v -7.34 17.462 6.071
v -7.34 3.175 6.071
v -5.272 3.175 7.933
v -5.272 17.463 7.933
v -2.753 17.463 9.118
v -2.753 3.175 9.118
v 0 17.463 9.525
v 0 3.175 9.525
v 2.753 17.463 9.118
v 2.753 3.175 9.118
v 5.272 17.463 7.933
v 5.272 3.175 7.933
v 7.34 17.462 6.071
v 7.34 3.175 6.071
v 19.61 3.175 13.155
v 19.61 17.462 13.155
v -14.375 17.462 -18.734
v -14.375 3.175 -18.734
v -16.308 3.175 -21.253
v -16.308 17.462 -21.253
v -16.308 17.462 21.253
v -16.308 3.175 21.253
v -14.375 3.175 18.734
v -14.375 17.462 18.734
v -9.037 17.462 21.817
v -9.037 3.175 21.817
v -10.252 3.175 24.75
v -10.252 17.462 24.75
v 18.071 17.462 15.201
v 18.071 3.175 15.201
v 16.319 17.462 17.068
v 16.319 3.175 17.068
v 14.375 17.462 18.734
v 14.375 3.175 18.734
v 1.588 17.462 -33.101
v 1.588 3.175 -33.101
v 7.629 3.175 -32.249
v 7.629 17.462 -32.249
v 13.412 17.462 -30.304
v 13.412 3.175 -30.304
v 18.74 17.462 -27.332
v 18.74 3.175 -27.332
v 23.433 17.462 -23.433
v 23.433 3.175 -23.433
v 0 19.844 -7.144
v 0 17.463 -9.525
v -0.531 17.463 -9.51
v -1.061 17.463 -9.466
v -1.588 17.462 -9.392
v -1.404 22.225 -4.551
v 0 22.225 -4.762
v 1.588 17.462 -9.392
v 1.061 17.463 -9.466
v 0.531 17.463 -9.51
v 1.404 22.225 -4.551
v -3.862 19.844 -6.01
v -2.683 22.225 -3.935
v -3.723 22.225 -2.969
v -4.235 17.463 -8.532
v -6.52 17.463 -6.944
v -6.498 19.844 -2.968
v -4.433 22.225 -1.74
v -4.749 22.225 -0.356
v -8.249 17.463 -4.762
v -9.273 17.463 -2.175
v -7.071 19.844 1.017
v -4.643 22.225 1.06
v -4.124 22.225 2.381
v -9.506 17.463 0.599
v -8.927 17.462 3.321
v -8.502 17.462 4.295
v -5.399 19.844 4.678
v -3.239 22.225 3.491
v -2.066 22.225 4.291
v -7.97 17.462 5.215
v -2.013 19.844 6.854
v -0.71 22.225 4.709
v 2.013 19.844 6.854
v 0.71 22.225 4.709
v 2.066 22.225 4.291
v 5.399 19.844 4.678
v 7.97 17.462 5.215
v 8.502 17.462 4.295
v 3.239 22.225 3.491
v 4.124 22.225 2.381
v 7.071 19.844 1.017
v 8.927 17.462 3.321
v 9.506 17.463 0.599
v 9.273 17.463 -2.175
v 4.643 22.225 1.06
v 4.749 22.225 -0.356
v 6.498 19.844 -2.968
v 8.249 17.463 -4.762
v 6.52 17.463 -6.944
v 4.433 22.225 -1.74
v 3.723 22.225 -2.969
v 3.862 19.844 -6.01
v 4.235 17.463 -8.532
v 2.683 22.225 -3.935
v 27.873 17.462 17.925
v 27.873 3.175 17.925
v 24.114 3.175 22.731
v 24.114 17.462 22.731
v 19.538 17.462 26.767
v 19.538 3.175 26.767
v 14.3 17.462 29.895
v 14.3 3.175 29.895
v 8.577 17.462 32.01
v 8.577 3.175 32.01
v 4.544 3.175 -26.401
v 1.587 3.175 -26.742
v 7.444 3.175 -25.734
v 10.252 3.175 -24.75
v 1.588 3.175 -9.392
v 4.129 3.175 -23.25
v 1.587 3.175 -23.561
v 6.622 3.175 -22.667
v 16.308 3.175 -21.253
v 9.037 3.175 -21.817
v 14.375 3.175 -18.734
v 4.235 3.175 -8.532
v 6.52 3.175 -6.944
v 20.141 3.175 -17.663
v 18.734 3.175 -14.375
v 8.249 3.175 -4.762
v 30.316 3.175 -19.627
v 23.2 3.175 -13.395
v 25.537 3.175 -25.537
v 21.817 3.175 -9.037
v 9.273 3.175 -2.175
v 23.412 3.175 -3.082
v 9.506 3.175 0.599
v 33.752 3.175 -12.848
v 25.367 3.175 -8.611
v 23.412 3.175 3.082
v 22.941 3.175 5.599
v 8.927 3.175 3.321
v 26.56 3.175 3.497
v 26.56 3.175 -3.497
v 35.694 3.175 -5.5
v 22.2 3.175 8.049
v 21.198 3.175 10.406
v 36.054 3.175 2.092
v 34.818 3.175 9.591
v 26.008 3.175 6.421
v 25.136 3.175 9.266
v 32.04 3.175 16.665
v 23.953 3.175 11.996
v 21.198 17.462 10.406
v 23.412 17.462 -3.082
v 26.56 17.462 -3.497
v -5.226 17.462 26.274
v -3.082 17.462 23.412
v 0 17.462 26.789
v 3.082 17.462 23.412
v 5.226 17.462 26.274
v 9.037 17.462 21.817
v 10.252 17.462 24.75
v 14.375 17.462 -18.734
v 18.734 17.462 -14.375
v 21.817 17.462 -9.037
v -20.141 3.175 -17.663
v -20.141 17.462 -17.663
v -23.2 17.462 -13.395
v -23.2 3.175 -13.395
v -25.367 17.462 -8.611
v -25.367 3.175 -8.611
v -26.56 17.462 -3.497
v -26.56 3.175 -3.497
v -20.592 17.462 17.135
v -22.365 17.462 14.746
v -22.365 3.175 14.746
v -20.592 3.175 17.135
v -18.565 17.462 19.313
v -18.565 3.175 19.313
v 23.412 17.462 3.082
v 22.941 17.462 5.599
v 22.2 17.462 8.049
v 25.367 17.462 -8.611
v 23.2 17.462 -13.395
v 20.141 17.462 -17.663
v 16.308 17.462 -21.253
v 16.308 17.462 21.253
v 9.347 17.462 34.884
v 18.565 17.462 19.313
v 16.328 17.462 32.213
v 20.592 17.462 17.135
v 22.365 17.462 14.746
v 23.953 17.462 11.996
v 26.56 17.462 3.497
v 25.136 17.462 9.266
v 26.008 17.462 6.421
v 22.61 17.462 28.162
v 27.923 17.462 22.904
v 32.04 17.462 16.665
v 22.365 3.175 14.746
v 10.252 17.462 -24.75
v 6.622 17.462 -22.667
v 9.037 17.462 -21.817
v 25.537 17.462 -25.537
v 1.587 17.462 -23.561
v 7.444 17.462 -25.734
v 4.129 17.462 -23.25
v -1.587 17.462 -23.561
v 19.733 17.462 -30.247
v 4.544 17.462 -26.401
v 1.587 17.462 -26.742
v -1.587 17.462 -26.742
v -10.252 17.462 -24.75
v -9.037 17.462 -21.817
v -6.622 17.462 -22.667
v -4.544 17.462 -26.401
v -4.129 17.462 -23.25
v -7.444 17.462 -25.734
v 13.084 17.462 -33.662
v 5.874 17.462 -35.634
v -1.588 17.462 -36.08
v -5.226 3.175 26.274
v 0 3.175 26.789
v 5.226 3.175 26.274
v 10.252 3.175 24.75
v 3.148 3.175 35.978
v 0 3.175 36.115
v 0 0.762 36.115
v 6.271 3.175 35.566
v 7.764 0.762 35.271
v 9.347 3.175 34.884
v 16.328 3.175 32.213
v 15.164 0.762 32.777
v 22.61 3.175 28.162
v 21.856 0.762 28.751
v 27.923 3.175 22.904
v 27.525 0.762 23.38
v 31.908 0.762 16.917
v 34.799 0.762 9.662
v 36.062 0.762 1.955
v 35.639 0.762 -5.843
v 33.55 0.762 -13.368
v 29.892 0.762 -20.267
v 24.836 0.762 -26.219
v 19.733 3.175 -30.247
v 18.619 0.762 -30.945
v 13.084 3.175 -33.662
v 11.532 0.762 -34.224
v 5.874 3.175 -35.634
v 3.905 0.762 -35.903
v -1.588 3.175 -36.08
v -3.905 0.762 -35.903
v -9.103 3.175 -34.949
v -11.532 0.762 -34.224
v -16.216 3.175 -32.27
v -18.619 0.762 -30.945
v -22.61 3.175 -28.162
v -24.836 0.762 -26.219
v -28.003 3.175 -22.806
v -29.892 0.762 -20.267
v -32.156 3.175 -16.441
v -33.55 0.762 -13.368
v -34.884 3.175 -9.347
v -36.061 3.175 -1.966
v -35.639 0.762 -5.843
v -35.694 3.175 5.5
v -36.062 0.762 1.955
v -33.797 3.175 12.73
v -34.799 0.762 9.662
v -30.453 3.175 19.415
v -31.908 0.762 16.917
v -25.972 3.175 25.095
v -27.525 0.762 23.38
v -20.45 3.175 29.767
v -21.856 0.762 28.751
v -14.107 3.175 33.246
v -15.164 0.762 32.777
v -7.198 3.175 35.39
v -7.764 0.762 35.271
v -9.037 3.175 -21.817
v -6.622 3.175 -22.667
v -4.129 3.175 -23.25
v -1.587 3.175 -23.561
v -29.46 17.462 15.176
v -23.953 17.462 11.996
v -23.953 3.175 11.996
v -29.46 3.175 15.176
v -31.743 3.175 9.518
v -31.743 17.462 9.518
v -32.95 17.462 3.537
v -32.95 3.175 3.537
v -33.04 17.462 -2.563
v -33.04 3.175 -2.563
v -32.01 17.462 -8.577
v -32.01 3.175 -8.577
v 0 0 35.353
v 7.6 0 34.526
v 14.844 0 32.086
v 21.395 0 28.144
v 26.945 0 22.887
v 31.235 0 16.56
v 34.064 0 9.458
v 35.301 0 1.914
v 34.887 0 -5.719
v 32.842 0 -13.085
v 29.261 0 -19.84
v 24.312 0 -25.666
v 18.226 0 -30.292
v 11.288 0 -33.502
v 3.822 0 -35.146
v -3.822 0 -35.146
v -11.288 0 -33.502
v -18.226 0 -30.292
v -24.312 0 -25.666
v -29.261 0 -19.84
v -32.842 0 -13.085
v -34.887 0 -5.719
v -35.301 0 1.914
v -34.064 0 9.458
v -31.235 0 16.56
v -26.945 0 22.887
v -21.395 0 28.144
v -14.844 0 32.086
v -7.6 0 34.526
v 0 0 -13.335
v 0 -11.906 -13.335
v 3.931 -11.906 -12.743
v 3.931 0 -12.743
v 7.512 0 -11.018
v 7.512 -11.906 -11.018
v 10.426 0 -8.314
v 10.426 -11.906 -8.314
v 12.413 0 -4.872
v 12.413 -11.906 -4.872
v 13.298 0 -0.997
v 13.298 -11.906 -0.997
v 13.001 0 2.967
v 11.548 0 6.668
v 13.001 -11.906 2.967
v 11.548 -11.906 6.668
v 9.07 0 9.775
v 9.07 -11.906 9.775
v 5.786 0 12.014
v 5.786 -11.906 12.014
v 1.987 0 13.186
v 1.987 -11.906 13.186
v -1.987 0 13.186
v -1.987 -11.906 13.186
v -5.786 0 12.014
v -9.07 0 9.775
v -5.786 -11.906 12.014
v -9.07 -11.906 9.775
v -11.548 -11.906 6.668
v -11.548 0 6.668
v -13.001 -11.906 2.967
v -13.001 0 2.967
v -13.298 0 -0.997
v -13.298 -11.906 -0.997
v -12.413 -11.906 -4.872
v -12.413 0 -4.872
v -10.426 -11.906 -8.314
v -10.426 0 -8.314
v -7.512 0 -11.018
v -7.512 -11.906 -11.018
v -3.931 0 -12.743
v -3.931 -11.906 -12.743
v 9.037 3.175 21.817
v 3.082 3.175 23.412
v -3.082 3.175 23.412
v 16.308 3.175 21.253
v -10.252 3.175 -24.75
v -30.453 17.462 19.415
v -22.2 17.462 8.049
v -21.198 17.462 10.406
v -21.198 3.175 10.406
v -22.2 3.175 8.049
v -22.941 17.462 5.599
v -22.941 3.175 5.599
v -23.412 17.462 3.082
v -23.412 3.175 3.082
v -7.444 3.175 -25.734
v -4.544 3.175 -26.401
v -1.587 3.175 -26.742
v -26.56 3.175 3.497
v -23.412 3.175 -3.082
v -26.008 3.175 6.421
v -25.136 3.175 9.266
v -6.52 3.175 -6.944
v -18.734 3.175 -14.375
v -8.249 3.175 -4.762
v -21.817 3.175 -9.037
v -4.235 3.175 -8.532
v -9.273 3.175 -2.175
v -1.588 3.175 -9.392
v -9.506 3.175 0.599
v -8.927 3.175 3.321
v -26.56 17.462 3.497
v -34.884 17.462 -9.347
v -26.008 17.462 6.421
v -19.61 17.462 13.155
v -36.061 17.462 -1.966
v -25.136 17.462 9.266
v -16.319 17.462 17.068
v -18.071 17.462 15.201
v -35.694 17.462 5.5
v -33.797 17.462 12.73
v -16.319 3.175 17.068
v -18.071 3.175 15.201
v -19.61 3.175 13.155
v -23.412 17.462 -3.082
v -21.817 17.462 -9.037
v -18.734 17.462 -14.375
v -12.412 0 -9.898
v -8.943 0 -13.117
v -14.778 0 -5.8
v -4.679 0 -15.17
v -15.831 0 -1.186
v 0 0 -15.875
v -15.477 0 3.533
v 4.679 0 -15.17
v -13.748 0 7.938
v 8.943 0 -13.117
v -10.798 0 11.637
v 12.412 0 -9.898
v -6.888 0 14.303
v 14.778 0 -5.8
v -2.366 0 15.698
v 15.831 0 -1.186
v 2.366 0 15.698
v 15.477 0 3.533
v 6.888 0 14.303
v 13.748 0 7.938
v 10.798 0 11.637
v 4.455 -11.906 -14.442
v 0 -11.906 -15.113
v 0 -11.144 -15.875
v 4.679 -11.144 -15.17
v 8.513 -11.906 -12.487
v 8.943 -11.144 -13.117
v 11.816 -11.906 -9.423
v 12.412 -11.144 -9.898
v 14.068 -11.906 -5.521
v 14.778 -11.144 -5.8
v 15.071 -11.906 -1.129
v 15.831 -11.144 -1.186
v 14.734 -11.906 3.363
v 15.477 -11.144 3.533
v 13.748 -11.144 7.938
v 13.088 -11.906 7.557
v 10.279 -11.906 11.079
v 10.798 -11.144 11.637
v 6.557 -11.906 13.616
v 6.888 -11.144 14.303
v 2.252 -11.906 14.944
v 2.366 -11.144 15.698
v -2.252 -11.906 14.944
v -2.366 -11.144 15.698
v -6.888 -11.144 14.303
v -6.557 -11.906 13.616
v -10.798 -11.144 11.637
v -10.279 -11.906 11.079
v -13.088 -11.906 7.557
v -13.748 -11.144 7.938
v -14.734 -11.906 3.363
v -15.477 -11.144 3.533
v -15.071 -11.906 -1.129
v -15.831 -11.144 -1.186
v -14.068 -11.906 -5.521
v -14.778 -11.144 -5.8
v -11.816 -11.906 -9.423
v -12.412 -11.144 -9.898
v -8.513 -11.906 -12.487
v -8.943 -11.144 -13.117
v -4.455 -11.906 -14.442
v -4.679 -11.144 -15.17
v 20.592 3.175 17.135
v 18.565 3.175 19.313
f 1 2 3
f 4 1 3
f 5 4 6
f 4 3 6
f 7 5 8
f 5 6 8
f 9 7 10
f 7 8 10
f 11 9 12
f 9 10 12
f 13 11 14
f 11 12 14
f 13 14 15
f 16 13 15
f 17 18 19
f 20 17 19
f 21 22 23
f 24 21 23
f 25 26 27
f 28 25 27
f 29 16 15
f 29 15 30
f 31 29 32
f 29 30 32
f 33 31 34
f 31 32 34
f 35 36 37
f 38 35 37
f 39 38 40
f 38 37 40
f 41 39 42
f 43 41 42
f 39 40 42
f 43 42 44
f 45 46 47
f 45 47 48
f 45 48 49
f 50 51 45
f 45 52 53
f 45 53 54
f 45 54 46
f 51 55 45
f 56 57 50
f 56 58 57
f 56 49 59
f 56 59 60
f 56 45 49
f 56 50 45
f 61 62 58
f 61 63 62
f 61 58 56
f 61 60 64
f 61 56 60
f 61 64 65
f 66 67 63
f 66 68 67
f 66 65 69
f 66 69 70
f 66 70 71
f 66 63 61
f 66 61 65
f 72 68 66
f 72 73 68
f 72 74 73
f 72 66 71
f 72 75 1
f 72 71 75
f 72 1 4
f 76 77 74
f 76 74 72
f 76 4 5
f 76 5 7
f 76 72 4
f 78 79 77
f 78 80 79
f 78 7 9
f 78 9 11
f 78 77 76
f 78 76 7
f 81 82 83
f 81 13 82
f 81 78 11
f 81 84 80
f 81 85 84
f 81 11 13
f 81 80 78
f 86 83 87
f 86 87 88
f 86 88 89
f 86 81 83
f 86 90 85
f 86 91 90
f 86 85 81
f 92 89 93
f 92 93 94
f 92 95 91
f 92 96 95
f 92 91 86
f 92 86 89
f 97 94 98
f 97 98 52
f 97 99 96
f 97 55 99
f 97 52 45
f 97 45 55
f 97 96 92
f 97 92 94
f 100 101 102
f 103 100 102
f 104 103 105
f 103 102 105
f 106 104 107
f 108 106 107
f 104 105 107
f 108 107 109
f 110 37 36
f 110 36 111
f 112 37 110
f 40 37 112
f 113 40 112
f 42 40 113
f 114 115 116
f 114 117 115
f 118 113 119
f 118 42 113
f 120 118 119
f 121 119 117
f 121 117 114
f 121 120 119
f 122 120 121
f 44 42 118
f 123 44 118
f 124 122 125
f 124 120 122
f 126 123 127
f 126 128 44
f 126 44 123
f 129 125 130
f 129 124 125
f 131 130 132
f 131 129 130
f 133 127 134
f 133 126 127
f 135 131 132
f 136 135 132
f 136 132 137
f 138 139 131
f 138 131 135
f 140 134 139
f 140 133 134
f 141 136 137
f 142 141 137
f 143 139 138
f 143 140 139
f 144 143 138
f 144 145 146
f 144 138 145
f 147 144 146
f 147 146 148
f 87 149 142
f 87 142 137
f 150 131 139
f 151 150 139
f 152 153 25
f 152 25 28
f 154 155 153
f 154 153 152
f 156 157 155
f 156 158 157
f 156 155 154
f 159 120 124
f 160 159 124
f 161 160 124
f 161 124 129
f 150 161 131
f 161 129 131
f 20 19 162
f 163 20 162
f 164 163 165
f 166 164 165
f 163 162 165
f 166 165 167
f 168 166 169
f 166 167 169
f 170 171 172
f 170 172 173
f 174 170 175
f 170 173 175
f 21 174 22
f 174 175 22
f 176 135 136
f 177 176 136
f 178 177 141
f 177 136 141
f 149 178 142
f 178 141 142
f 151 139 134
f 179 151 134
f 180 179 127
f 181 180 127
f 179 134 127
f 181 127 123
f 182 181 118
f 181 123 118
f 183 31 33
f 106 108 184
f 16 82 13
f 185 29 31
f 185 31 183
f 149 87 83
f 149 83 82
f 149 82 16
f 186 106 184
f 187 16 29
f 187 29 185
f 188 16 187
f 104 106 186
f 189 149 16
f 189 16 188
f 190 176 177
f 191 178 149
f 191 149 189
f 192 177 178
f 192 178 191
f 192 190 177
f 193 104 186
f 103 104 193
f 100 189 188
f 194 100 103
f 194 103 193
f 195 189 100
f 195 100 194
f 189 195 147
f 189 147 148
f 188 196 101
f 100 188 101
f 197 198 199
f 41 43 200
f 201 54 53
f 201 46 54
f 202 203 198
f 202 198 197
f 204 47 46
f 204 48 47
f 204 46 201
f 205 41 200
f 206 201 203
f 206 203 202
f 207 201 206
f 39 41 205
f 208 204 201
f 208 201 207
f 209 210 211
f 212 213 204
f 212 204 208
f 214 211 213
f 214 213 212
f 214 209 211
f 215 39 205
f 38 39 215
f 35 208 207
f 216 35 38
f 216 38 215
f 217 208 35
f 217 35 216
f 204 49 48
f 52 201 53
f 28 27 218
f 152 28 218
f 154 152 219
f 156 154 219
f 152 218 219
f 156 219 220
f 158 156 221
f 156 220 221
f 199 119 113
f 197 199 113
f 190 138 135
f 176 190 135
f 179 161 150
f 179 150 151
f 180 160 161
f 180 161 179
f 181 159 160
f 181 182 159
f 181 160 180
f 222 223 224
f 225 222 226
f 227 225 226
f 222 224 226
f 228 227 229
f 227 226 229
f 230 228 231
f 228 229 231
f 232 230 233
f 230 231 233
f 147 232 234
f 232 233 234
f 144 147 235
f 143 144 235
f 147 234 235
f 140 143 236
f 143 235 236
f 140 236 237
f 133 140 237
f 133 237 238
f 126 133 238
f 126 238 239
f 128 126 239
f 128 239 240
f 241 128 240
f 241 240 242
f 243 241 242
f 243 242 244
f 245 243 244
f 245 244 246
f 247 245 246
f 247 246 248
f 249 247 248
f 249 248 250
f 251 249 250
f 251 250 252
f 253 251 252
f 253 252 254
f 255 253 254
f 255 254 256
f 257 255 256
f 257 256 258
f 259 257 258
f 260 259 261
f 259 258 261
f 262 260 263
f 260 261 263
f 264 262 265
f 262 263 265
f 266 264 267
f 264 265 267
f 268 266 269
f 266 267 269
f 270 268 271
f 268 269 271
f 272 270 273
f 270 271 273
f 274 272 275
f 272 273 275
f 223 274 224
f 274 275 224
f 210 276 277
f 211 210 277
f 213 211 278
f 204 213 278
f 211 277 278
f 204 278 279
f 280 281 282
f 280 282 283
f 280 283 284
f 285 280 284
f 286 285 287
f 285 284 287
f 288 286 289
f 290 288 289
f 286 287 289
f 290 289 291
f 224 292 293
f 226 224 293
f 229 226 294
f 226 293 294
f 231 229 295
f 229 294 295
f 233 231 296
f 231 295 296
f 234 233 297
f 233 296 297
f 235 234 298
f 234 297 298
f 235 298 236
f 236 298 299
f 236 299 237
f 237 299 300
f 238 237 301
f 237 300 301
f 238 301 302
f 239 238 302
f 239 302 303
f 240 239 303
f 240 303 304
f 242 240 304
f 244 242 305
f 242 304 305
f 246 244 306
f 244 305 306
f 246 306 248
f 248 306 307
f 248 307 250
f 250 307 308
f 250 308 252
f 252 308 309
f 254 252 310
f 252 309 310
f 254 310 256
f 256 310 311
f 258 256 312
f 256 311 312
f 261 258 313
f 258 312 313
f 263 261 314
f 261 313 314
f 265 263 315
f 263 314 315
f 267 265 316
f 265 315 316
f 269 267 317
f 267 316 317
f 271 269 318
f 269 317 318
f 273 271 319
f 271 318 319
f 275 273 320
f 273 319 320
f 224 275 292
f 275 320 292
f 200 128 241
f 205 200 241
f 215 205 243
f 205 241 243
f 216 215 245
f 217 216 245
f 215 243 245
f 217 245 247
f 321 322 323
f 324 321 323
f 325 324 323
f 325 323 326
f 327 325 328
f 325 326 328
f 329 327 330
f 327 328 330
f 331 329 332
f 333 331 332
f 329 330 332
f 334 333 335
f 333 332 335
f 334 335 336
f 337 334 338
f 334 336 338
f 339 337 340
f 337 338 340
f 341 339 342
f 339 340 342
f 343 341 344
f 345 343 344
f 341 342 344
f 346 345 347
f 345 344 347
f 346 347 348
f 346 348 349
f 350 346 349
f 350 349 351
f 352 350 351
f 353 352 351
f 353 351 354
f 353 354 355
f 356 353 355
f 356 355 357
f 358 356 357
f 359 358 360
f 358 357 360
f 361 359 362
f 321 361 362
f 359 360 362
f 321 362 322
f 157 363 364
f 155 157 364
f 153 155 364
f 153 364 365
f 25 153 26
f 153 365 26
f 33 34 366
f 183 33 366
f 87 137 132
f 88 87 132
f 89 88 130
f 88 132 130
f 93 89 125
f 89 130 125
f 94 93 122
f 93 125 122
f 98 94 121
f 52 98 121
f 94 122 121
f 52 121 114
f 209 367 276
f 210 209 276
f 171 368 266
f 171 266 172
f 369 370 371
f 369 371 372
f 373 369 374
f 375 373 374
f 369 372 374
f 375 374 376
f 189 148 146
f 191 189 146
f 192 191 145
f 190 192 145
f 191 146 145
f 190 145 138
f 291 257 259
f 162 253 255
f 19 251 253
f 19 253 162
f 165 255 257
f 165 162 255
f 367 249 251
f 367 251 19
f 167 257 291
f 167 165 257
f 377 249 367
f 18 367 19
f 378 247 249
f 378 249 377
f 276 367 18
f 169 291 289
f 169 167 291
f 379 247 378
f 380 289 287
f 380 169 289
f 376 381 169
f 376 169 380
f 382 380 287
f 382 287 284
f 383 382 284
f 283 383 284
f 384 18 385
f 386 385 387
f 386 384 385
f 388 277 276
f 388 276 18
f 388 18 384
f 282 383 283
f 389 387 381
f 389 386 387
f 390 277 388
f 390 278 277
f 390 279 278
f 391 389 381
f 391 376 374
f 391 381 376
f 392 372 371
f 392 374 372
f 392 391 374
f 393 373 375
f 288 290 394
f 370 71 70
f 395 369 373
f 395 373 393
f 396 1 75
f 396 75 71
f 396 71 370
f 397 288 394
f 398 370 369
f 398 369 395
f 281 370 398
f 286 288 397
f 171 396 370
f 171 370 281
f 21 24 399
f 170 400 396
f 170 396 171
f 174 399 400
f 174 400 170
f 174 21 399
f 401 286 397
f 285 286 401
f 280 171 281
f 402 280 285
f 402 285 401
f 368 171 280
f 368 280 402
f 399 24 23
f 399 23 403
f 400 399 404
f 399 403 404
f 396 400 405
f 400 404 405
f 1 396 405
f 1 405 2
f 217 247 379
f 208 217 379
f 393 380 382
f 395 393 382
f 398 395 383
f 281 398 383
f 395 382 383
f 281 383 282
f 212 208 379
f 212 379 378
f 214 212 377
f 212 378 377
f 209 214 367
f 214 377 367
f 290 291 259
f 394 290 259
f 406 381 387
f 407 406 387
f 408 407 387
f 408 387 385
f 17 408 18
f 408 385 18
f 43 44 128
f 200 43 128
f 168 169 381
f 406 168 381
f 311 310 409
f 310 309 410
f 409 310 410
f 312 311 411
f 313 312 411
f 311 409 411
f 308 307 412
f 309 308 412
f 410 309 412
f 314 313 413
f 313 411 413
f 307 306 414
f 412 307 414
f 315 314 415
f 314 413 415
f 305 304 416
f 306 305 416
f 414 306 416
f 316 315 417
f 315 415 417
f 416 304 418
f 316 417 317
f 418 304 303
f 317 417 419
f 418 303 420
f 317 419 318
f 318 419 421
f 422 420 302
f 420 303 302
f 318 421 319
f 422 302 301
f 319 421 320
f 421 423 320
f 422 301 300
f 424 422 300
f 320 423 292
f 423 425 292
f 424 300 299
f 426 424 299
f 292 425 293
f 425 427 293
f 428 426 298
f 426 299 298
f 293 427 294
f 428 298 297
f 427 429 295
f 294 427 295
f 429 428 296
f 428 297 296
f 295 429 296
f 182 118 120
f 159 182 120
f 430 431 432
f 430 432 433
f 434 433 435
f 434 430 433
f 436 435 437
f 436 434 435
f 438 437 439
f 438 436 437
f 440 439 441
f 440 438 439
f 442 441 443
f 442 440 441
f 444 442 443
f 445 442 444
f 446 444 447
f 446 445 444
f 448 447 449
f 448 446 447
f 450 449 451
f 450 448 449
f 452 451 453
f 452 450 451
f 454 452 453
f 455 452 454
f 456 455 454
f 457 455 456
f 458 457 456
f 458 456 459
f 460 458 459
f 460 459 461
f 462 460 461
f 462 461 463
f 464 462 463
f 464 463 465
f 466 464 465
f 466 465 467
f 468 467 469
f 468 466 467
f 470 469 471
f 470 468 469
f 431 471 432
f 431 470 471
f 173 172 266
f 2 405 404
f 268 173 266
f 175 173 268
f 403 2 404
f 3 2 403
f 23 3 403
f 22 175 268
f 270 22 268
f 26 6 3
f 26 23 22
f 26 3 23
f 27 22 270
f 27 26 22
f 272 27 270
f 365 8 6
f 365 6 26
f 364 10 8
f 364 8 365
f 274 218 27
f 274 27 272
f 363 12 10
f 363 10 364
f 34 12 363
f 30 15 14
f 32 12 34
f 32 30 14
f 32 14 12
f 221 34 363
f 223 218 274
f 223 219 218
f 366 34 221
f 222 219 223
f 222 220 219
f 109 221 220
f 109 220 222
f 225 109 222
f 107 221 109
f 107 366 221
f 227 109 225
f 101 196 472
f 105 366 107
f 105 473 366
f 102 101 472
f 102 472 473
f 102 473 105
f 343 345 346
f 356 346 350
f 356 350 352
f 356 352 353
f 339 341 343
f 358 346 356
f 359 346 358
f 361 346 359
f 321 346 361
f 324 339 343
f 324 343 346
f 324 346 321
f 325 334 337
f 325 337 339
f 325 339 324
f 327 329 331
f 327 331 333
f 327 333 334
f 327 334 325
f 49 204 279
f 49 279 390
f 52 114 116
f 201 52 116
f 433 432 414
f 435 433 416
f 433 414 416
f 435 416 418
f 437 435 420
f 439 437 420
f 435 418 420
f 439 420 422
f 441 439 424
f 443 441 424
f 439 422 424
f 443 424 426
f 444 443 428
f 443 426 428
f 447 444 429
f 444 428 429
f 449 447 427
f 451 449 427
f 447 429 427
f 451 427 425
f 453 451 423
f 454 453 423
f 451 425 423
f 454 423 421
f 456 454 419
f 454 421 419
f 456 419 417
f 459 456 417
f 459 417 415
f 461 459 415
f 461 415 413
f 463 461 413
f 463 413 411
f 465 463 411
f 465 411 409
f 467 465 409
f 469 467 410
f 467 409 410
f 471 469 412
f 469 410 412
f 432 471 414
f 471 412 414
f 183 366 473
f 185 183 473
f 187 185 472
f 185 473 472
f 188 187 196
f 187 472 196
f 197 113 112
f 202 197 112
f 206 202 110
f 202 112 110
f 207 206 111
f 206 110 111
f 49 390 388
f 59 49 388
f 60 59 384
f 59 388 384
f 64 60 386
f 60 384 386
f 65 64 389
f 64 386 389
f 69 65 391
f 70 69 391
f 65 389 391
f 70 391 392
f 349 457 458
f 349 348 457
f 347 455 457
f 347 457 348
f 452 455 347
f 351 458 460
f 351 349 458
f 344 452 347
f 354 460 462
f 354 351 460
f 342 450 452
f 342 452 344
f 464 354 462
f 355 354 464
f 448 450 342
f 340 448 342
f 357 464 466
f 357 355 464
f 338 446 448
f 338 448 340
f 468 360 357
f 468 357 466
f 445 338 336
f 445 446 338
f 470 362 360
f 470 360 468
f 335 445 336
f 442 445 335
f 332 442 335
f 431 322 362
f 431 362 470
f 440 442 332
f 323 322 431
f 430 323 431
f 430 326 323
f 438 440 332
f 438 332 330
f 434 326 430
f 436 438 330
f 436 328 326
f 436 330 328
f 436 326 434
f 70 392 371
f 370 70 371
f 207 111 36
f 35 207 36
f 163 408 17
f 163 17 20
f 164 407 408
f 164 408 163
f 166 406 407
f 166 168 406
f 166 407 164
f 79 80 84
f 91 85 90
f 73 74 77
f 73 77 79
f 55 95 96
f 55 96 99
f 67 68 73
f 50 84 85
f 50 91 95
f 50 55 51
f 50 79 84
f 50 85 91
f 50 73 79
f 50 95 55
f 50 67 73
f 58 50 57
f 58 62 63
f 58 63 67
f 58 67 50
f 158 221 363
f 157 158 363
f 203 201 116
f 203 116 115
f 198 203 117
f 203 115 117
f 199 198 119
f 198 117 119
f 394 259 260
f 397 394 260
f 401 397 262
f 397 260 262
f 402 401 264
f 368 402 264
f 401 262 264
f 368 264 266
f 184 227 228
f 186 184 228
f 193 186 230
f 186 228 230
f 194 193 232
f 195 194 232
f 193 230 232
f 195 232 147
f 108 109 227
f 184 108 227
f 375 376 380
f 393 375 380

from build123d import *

# Parameters (mm, degrees)
SKETCH1_R           = 36.11499
BOSS_EXTRUDE1_DEPTH = 3.175
SKETCH2_R           = 9.525
BOSS_EXTRUDE3_DEPTH = 19.05
CHAMFER1_SIZE       = 4.7625
SKETCH5_R           = 15.875
BOSS_EXTRUDE4_DEPTH = 11.90625
BOSS_EXTRUDE5_DEPTH = 14.2875
CIRPATTERN1_COUNT   = 3
BOSS_EXTRUDE6_DEPTH = 14.2875
CIRPATTERN2_COUNT   = 6
SKETCH9_R           = 13.335
CUT_EXTRUDE1_DEPTH  = 11.90625
CHAMFER2_SIZE       = 0.762
CHAMFER3_SIZE       = 0.762


with BuildPart() as part:
    # Sketch1 → Boss-Extrude1 (new body)
    with BuildSketch(Plane(origin=(0, 0, 0), x_dir=(1, 0, 0), z_dir=(0, 1, 0))):
        with Locations(Location((0, 0, 0), (0, 0, 270))):
            Circle(SKETCH1_R)
    extrude(amount=BOSS_EXTRUDE1_DEPTH)

    # Sketch2 → Boss-Extrude3 (add)
    with BuildSketch(Plane(origin=(0, 3.175, 0), x_dir=(1, 0, 0), z_dir=(0, 1, 0))):
        with Locations(Location((0, 0, 0), (0, 0, 90))):
            Circle(SKETCH2_R)
    extrude(amount=BOSS_EXTRUDE3_DEPTH)

    # Chamfer1
    chamfer1_edges = [part.edges().sort_by_distance(p)[0] for p in [
        (0, 22.225, 9.525),
    ]]
    chamfer(chamfer1_edges, length=CHAMFER1_SIZE)

    # Sketch5 → Boss-Extrude4 (add)
    with BuildSketch(Plane.XZ):
        with Locations(Location((0, 0, 0), (0, 0, 270))):
            Circle(SKETCH5_R)
    extrude(amount=BOSS_EXTRUDE4_DEPTH)

    # Sketch6 → Boss-Extrude5 (add)
    with BuildSketch(Plane(origin=(0, 3.175, 0), x_dir=(1, 0, 0), z_dir=(0, 1, 0))):
        with BuildLine():
            Line((-1.5875, 36.080082406), (-1.5875, 9.391776656))
            ThreePointArc((-1.5875, 9.391776656), (0, 9.525), (1.5875, 9.391776656))
            Line((1.5875, 9.391776656), (1.5875, 33.101016708))
            ThreePointArc((1.5875, 33.101016708), (13.411669734, 30.303870682), (23.432855816, 23.432855816))
            Line((23.432855816, 23.432855816), (25.537154331, 25.537154331))
            ThreePointArc((25.537154331, 25.537154331), (13.083761644, 33.661664902), (-1.5875, 36.080082406))
        make_face()
    boss_extrude5 = extrude(amount=BOSS_EXTRUDE5_DEPTH)

    # CirPattern1: Boss-Extrude5 ×3 about axis
    cirpattern1_axis = Axis((0, 22.225, 0), (0, -1, 0))
    for i in range(1, CIRPATTERN1_COUNT):
        add(boss_extrude5.rotate(cirpattern1_axis, i * 360 / CIRPATTERN1_COUNT))

    # Sketch8 → Boss-Extrude6 (add)
    with BuildSketch(Plane(origin=(0, 3.175, 0), x_dir=(1, 0, 0), z_dir=(0, 1, 0))):
        with BuildLine():
            ThreePointArc((14.375330432, 18.734295362), (20.450378012, 11.80703125), (23.412040922, 3.082253661))
            Line((23.412040922, 3.082253661), (26.559878357, 3.496674321))
            ThreePointArc((26.559878357, 3.496674321), (23.200008669, 13.39453125), (16.308147969, 21.253192218))
            Line((16.308147969, 21.253192218), (14.375330432, 18.734295362))
        make_face()
    boss_extrude6 = extrude(amount=BOSS_EXTRUDE6_DEPTH)

    # CirPattern2: Boss-Extrude6 ×6 about axis
    cirpattern2_axis = Axis((0, 0, 0), (0, 1, 0))
    for i in range(1, CIRPATTERN2_COUNT):
        add(boss_extrude6.rotate(cirpattern2_axis, i * 360 / CIRPATTERN2_COUNT))

    # Sketch9 → Cut-Extrude1 (cut)
    with BuildSketch(Plane.XZ.offset(11.90625)):
        with Locations(Location((0, 0, 0), (0, 0, 270))):
            Circle(SKETCH9_R)
    extrude(amount=-CUT_EXTRUDE1_DEPTH, mode=Mode.SUBTRACT)

    # Chamfer2
    chamfer2_edges = [part.edges().sort_by_distance(p)[0] for p in [
        (0, 0, -36.11499),
    ]]
    chamfer(chamfer2_edges, length=CHAMFER2_SIZE)

    # Chamfer3
    chamfer3_edges = [part.edges().sort_by_distance(p)[0] for p in [
        (0, -11.90625, 15.875),
    ]]
    chamfer(chamfer3_edges, length=CHAMFER3_SIZE)


solid = part.part
